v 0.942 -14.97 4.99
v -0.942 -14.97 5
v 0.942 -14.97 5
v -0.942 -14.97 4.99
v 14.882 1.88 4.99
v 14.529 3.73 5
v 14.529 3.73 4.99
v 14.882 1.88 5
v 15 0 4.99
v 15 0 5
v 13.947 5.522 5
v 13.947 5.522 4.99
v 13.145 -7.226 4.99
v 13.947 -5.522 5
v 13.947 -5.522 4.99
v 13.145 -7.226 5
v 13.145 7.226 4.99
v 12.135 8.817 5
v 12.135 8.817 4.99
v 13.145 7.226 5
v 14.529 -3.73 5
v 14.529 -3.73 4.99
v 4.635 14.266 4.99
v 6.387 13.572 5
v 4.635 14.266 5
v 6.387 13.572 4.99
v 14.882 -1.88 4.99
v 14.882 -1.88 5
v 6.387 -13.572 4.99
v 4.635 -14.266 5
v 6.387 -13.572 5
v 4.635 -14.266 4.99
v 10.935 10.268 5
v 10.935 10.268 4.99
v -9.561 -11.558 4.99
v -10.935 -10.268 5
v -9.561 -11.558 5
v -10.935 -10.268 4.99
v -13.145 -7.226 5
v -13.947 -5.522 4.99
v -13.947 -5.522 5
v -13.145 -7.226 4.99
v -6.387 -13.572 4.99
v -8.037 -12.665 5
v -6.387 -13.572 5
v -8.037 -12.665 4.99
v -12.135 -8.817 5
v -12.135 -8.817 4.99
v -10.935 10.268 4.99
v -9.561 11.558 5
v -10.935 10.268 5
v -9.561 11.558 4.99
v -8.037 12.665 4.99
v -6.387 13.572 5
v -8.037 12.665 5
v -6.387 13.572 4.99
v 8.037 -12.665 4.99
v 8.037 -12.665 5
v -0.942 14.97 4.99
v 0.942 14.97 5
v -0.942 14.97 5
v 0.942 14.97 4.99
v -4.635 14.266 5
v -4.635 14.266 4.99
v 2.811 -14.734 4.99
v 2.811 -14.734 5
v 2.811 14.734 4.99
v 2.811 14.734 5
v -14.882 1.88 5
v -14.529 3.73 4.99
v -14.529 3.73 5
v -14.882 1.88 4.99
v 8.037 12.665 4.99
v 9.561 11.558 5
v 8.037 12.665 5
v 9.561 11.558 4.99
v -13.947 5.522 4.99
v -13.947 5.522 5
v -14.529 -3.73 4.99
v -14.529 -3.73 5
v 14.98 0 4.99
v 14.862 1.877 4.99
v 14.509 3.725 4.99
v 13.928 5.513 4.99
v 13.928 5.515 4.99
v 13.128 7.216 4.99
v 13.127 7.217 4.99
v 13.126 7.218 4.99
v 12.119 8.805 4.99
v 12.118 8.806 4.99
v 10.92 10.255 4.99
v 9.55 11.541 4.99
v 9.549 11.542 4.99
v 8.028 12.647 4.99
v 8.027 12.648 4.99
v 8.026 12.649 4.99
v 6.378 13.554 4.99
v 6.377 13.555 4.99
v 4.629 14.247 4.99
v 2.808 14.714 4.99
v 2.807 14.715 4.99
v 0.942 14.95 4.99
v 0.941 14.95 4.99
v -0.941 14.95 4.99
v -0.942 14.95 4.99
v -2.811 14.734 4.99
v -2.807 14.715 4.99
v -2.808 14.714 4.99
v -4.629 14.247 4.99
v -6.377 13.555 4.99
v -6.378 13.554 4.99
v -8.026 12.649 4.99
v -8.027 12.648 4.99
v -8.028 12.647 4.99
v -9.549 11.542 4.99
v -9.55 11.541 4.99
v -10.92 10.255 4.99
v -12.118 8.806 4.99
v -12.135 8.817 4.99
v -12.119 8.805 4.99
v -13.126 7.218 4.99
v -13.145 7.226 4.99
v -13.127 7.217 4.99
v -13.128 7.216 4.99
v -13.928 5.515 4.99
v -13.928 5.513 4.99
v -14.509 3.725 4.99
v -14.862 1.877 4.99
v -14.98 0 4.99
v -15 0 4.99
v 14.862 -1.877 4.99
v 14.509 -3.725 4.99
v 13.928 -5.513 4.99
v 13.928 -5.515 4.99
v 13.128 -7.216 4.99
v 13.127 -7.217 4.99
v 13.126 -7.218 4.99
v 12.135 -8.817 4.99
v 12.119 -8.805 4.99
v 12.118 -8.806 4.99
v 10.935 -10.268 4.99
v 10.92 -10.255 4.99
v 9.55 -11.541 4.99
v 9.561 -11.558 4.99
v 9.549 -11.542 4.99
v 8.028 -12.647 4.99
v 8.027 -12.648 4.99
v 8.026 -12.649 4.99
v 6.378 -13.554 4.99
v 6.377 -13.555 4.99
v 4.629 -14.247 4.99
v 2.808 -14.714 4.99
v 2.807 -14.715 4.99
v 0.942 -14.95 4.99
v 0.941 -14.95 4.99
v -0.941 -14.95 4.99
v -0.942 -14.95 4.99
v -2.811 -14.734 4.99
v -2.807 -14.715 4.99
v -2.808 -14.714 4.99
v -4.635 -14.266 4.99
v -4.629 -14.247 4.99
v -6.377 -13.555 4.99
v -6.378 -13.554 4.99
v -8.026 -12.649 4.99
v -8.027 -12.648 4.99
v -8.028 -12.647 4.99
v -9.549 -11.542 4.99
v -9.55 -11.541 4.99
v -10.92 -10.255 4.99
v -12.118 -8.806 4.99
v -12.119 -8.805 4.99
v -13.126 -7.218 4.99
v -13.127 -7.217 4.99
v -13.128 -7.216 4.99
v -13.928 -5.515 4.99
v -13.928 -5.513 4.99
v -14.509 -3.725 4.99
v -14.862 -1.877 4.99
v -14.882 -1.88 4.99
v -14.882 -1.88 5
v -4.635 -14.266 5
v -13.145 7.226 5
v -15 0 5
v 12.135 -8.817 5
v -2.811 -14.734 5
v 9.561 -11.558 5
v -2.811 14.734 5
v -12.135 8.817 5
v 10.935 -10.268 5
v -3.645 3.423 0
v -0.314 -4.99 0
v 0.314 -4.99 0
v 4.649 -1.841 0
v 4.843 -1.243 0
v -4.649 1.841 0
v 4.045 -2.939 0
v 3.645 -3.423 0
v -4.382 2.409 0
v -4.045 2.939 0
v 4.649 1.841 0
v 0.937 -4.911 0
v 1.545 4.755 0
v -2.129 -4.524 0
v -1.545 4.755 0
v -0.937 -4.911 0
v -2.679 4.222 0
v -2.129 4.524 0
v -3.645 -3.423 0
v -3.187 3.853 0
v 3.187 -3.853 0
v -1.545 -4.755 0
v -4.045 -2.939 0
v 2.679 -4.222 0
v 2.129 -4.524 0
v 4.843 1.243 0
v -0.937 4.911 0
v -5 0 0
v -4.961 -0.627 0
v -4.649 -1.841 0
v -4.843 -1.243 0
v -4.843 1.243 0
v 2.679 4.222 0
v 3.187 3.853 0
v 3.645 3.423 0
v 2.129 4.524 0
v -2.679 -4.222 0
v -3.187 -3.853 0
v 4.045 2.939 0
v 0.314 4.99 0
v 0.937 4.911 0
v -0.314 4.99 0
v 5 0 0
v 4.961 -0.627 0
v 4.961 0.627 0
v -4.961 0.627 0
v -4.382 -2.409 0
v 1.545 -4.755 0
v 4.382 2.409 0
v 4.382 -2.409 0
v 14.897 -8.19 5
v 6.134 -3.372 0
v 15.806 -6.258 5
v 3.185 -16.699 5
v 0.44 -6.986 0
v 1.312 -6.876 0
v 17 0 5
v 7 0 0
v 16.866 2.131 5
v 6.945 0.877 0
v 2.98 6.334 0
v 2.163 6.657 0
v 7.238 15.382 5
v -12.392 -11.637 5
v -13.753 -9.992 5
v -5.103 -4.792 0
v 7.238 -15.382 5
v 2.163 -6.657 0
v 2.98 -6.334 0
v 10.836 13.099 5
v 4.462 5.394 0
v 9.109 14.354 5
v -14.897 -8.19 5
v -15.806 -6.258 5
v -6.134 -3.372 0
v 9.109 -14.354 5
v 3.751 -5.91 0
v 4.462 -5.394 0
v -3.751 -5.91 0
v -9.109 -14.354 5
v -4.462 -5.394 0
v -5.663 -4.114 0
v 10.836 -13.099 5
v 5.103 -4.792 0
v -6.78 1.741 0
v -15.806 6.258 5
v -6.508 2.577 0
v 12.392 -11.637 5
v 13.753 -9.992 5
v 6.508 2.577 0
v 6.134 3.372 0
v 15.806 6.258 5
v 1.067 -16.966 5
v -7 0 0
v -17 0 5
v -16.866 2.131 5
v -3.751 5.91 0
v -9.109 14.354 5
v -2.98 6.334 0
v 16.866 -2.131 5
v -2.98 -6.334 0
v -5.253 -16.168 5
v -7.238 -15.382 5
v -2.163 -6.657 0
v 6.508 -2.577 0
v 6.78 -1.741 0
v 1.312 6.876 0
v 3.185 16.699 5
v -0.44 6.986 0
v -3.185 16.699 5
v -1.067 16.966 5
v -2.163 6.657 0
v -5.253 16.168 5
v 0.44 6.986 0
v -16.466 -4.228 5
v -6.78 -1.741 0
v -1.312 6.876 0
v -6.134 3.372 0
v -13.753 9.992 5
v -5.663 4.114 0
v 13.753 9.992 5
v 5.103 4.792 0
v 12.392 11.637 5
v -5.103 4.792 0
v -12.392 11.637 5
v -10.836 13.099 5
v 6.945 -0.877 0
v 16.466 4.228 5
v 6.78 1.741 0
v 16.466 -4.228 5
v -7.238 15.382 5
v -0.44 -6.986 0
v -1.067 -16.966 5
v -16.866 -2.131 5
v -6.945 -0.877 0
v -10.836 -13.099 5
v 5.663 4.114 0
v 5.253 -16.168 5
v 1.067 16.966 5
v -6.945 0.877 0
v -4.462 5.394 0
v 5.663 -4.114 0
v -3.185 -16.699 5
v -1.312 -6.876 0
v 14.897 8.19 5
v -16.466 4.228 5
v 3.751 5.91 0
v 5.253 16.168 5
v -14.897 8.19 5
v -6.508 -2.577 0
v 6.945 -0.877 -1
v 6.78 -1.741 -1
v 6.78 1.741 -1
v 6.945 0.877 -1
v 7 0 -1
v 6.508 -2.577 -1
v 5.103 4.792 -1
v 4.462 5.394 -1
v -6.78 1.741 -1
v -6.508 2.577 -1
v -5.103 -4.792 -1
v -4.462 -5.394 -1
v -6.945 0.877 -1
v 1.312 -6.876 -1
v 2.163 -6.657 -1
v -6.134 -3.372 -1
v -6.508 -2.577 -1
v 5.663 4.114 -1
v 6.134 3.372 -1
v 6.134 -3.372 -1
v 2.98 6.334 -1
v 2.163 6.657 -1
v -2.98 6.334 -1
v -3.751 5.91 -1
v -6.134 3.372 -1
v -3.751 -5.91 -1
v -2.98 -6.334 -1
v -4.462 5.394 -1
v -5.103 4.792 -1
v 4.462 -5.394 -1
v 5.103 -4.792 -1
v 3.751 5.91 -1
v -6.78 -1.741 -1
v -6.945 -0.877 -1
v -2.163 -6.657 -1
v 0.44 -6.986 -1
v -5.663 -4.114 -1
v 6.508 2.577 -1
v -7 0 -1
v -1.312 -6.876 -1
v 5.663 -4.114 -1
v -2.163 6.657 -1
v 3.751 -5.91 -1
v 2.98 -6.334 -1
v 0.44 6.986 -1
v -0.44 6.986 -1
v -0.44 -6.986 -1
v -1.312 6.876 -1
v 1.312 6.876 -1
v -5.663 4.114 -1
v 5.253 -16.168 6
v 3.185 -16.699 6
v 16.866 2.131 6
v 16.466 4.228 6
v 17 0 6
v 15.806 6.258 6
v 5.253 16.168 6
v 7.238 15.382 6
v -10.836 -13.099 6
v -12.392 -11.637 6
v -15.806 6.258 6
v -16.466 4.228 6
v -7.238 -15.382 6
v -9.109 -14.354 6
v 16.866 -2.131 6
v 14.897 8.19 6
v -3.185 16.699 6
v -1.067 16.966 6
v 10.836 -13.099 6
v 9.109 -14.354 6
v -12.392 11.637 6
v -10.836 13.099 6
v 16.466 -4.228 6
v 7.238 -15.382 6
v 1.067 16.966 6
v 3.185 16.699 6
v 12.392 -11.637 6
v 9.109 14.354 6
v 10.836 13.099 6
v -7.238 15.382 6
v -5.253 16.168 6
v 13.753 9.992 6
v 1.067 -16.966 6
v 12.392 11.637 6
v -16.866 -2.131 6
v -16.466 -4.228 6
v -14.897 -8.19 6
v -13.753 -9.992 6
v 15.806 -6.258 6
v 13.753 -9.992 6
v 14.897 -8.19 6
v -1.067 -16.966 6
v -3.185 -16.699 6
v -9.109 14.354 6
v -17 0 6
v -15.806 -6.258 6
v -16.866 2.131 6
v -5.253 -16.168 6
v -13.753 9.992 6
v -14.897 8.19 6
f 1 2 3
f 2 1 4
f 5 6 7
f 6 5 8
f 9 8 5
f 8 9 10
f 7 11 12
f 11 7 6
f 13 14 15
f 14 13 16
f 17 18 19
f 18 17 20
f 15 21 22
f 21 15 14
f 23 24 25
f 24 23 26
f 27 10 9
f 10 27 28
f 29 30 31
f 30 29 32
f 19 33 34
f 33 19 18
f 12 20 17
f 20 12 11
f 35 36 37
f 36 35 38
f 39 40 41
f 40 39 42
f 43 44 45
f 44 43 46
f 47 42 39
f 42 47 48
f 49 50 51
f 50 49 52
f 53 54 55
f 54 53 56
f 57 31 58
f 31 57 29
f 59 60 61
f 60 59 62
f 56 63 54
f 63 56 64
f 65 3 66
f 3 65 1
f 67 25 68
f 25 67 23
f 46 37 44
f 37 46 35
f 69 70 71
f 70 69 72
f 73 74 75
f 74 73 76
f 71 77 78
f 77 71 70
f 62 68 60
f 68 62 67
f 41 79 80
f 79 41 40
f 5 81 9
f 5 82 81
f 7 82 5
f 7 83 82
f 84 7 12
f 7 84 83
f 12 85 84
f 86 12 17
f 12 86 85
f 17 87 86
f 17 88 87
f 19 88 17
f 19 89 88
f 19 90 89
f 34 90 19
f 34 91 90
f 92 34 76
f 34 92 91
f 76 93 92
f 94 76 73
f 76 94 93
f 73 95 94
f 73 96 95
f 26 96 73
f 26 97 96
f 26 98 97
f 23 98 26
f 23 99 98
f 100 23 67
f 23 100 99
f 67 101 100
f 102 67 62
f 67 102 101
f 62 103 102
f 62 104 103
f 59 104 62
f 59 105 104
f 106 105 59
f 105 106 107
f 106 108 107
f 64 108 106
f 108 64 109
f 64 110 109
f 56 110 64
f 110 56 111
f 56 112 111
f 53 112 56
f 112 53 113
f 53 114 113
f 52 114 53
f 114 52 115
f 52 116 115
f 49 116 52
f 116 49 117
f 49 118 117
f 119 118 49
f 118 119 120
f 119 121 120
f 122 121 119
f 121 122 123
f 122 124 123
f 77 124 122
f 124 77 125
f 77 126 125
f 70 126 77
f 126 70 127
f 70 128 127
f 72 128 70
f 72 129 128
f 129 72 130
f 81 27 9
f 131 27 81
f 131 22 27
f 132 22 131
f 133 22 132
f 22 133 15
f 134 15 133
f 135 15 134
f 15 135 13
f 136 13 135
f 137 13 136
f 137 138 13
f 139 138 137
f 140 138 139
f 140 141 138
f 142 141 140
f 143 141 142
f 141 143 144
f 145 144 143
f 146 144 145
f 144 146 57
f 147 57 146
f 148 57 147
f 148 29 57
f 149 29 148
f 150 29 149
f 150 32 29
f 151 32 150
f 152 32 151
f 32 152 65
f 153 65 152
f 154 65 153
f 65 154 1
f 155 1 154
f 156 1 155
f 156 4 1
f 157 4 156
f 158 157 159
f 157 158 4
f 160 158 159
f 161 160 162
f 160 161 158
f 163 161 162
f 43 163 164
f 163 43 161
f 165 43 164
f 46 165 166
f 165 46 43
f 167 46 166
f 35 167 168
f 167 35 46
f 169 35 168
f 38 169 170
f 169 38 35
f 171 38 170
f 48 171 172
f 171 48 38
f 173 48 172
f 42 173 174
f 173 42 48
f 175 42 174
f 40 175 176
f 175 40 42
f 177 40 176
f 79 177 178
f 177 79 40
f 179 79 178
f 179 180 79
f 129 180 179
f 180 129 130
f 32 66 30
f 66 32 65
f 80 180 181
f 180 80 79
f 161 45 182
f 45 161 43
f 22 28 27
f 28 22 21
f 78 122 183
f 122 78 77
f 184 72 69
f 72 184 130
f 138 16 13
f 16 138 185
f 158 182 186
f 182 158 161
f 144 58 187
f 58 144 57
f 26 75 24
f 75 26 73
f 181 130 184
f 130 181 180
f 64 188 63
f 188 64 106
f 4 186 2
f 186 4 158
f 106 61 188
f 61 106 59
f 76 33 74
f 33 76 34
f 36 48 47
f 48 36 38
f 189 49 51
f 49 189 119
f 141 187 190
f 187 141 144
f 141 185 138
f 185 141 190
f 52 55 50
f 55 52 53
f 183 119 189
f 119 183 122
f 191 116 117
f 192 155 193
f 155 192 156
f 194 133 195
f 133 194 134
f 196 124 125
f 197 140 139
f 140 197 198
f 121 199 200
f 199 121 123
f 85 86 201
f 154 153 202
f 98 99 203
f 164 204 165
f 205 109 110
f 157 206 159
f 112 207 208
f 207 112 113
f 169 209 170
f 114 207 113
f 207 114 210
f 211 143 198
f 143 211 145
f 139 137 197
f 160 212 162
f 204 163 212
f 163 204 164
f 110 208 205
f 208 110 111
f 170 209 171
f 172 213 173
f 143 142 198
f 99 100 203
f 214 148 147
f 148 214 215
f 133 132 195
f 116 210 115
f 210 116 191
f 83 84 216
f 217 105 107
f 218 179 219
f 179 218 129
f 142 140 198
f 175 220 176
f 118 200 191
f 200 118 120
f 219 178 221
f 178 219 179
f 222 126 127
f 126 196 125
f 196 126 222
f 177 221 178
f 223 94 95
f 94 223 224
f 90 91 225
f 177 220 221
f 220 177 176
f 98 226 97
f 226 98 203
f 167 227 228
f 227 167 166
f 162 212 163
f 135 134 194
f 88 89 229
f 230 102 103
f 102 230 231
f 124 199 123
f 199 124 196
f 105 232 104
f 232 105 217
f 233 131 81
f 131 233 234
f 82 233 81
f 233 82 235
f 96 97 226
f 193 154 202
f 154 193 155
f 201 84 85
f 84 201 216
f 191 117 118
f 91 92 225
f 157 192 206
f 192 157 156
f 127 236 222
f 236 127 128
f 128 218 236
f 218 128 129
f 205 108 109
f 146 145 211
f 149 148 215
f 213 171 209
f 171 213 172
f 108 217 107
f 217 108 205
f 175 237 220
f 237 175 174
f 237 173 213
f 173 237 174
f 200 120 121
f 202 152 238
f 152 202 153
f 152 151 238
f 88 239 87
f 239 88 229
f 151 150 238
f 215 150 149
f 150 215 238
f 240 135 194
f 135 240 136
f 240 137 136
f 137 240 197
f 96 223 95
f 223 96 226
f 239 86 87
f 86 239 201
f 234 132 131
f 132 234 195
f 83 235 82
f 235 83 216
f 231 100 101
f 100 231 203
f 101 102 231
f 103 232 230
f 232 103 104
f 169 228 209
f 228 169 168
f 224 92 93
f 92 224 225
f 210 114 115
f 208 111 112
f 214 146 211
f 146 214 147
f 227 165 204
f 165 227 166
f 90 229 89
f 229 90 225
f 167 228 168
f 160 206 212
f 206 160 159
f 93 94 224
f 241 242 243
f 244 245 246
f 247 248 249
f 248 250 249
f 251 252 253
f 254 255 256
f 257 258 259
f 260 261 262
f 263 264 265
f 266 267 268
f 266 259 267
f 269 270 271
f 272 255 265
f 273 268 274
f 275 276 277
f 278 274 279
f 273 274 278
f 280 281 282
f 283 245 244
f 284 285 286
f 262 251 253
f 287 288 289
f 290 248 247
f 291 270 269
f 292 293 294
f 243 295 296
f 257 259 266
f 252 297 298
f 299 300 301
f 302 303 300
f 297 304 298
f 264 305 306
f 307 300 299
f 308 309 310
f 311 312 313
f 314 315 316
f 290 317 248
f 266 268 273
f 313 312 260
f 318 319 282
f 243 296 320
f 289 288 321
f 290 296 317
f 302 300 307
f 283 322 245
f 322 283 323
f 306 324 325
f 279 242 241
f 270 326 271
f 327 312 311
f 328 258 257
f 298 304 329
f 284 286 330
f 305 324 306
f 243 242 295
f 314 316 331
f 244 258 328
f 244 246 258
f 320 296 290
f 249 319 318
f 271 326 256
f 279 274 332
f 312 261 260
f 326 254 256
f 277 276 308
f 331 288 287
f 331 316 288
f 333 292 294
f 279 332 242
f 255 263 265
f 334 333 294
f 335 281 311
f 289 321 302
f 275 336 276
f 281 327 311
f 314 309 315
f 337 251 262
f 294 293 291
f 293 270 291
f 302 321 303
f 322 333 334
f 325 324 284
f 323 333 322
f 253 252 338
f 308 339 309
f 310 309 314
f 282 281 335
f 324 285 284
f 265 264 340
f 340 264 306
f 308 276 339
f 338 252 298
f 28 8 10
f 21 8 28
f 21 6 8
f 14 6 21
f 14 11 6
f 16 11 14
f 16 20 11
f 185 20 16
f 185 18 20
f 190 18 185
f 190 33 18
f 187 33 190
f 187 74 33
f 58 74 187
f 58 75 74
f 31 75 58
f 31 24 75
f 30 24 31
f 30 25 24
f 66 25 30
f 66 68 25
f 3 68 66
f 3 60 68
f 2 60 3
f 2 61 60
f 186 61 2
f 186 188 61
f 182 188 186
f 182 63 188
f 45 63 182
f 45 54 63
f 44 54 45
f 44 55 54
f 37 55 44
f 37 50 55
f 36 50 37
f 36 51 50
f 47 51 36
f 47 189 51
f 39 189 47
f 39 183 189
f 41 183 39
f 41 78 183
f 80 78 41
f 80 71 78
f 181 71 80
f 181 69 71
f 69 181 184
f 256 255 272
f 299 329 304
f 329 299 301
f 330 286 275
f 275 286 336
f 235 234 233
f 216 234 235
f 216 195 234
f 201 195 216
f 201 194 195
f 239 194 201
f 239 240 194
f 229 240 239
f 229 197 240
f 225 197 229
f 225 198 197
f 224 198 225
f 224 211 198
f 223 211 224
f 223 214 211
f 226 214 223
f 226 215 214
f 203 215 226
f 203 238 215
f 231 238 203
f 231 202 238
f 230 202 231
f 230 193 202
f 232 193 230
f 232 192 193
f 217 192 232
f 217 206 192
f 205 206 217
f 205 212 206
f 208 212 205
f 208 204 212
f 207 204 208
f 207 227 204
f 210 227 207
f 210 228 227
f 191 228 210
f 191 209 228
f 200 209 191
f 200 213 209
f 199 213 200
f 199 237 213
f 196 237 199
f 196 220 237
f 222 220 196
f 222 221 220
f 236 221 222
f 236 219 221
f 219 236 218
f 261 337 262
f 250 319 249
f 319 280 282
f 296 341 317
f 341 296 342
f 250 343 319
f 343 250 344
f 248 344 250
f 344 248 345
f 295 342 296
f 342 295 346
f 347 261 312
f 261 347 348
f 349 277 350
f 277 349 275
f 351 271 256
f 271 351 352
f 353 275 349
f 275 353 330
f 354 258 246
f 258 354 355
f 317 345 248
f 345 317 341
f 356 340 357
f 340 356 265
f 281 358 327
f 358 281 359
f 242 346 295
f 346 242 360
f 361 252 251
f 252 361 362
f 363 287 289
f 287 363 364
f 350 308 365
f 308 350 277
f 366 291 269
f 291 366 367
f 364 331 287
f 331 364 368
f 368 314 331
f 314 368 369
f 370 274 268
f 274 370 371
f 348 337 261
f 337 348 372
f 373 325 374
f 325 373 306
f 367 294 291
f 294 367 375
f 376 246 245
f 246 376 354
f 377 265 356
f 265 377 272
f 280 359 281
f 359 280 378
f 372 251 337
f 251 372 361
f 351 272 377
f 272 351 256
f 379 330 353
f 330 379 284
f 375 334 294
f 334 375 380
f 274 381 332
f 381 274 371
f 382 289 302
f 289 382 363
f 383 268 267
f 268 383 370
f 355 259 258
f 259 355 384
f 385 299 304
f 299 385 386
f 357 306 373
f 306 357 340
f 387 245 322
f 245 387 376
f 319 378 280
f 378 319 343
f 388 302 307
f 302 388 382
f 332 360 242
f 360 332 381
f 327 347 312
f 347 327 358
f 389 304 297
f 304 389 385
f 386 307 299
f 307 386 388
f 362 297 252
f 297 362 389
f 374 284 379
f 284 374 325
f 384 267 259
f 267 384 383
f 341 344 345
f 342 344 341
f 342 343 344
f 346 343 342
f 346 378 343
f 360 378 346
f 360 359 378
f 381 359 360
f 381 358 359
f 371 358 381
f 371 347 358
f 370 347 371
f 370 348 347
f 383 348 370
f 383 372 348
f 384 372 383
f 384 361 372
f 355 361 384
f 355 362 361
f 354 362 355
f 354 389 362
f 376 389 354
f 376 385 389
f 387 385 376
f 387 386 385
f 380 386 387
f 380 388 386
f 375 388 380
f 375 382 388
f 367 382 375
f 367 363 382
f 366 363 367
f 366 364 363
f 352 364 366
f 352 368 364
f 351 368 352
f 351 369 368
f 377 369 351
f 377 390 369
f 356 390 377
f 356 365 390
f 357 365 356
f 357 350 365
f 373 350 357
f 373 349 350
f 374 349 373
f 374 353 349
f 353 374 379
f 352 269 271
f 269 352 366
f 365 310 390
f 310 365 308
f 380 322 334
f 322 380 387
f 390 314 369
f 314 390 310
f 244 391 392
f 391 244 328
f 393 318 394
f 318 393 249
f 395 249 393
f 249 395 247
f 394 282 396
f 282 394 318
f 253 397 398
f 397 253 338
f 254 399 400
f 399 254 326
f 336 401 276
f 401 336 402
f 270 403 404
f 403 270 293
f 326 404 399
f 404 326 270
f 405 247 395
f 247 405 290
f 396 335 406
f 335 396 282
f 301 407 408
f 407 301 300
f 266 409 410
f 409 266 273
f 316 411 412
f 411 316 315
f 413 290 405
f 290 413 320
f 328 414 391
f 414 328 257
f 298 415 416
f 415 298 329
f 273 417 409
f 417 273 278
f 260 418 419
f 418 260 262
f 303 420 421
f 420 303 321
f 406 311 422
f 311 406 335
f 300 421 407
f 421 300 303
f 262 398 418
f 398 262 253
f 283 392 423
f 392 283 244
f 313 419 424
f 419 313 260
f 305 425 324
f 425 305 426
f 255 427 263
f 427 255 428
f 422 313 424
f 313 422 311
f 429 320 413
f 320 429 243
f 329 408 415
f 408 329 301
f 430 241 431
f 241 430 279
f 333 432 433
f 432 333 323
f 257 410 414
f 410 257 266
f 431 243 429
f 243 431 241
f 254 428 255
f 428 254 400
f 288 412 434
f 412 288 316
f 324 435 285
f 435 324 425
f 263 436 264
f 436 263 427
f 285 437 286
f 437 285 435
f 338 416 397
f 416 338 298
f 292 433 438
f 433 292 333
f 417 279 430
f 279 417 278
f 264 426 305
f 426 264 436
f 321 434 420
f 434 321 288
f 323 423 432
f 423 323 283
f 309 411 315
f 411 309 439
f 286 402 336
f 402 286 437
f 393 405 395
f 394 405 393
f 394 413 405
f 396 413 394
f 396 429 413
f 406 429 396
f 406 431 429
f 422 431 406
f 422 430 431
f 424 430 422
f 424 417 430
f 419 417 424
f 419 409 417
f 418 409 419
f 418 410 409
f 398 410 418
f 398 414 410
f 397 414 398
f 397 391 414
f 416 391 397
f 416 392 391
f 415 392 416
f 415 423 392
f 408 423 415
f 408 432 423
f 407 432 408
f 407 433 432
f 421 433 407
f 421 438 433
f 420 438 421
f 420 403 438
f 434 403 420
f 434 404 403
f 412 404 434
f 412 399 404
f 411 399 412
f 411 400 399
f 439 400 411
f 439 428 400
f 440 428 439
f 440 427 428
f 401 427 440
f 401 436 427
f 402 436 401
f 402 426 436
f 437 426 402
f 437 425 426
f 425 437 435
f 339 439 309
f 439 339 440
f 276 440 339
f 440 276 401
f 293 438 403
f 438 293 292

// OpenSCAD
module cylinder_with_horizontal_thickness(d1, d2, h, w) {
    diamDifference = w*2;//(w*2) * cos(90 - atan((d2-d1)/(1*h)));
    difference() {
        cylinder(d1=d1+diamDifference, d2=d2+diamDifference, h=h);
        union() {
            translate([0, 0, -0.01]) cylinder(d=d1, h=0.02);
            translate([0, 0, h-0.01]) cylinder(d=d2, h=0.05);
            cylinder(d1=d1, d2=d2, h=h);
        }
    }
}
$fn=50;
thickness=2;
bd = 10;
td = 30;
cylinder_with_horizontal_thickness(bd, td, 5, 2);
color("grey") translate([0, 0, -1]) cylinder(d=bd+thickness*2, $fn=50);
color("grey") translate([0, 0, 5]) cylinder(d=td+thickness*2, $fn=50);
